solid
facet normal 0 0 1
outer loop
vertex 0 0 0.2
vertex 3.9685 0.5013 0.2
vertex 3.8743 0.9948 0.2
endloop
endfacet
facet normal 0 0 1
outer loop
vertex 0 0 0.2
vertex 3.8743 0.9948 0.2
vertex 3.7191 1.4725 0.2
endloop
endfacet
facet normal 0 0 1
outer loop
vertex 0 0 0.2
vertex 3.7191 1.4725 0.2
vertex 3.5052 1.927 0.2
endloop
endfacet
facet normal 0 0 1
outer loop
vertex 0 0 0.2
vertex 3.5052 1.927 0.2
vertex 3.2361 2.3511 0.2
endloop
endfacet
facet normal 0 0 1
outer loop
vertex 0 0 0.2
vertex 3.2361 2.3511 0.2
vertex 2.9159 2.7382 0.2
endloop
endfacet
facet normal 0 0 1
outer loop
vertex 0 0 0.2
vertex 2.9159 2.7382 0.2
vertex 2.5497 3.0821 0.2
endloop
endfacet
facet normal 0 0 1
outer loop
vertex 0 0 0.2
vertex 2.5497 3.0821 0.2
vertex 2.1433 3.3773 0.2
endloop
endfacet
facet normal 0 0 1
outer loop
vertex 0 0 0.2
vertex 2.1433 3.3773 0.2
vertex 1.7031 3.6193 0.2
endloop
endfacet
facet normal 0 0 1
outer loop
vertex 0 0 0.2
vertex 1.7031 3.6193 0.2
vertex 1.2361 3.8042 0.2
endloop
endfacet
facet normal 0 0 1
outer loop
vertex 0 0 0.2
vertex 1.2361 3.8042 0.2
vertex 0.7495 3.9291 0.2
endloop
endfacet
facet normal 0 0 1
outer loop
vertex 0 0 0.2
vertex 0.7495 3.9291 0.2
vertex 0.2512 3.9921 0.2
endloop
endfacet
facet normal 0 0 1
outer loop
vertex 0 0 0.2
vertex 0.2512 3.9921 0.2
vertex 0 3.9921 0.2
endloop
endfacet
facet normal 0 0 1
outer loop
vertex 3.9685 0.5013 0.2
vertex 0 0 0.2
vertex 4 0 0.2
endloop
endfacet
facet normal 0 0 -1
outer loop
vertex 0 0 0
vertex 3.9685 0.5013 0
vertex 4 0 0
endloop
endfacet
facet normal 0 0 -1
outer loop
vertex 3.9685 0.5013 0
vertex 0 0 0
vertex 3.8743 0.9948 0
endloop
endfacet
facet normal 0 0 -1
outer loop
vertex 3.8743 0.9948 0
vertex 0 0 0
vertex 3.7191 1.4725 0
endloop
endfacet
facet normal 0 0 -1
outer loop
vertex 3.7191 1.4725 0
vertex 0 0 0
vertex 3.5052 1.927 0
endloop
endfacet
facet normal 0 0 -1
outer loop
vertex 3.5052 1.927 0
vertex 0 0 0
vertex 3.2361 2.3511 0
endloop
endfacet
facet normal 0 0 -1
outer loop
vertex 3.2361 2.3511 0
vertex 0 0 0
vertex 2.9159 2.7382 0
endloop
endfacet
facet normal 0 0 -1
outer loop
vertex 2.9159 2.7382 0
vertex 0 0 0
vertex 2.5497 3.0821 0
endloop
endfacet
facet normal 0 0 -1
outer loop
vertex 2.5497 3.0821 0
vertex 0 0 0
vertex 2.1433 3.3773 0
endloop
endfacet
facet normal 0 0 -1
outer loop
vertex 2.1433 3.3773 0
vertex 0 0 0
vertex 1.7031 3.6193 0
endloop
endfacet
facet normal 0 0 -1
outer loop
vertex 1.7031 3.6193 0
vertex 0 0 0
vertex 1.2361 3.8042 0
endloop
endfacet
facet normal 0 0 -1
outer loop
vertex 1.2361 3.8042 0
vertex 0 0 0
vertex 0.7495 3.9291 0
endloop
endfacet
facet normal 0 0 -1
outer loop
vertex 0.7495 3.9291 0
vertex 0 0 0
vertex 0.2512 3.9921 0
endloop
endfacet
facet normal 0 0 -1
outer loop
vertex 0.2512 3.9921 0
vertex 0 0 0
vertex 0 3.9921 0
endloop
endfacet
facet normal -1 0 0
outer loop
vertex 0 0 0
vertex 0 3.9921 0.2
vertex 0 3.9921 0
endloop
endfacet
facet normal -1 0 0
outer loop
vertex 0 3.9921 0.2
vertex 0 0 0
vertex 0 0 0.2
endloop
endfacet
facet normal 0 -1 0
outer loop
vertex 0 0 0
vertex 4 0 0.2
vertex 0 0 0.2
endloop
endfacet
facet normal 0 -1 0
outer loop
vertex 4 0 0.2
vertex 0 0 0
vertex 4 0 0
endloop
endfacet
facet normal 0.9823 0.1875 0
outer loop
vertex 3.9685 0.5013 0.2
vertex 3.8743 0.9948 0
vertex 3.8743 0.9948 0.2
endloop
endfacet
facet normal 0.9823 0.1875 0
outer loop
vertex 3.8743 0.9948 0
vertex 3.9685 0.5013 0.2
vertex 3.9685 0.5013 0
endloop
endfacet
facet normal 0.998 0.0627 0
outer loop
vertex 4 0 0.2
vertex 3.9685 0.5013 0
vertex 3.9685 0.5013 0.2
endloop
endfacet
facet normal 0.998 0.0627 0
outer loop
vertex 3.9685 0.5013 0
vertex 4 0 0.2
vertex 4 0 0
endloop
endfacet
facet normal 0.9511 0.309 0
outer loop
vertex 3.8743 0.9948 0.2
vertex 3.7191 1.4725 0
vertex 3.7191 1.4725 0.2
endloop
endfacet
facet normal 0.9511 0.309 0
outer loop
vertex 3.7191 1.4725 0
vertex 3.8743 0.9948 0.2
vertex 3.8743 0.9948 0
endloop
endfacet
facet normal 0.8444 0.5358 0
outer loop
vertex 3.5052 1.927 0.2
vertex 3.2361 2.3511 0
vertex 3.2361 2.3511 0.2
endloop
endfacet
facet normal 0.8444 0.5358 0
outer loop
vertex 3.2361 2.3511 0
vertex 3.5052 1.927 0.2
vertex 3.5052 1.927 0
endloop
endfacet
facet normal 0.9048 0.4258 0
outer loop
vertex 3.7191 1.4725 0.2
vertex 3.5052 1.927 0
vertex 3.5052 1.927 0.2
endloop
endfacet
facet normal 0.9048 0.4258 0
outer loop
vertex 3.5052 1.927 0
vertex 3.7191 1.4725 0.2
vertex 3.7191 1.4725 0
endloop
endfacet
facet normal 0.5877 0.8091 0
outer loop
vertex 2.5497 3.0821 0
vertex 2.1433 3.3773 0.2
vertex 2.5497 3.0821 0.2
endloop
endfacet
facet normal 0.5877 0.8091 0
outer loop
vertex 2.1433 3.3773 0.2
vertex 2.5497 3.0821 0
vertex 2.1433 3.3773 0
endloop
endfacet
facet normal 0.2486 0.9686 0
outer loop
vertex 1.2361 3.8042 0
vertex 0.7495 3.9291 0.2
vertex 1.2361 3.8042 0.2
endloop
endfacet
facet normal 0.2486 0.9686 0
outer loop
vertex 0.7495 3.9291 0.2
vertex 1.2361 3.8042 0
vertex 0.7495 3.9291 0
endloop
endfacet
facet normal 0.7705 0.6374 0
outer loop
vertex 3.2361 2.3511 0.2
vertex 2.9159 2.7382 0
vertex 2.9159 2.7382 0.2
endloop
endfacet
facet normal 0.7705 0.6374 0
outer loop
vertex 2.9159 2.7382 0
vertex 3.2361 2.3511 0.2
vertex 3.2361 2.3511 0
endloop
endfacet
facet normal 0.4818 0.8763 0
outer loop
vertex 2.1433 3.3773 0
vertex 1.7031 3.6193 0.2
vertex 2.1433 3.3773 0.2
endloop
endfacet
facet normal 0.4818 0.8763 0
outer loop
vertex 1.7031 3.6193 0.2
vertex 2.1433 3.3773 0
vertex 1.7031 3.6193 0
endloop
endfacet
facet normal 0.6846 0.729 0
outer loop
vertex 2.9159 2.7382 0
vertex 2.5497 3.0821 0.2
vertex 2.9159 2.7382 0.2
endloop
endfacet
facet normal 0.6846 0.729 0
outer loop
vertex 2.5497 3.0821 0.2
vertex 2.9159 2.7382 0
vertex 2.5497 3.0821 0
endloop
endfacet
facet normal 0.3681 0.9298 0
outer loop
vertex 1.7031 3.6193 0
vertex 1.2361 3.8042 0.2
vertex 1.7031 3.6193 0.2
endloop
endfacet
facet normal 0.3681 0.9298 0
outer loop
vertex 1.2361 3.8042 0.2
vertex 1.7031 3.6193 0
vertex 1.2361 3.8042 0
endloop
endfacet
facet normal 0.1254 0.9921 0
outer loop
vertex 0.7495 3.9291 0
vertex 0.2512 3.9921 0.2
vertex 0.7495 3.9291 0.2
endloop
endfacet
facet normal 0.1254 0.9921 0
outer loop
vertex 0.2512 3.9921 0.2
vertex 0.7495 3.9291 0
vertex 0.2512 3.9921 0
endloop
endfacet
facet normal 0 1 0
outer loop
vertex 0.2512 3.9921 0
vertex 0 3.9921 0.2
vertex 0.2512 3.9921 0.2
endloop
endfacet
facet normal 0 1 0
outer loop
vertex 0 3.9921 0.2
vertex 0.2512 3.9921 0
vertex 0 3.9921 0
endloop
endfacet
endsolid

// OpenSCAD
module Street_03(){

intersection(){

translate([0,0,0]){
color("#3b4747")
cube([8,8,0.2]);
}

translate([0,0,0])
cylinder(4,4,4, $fn=50);



}
}

Street_03();
